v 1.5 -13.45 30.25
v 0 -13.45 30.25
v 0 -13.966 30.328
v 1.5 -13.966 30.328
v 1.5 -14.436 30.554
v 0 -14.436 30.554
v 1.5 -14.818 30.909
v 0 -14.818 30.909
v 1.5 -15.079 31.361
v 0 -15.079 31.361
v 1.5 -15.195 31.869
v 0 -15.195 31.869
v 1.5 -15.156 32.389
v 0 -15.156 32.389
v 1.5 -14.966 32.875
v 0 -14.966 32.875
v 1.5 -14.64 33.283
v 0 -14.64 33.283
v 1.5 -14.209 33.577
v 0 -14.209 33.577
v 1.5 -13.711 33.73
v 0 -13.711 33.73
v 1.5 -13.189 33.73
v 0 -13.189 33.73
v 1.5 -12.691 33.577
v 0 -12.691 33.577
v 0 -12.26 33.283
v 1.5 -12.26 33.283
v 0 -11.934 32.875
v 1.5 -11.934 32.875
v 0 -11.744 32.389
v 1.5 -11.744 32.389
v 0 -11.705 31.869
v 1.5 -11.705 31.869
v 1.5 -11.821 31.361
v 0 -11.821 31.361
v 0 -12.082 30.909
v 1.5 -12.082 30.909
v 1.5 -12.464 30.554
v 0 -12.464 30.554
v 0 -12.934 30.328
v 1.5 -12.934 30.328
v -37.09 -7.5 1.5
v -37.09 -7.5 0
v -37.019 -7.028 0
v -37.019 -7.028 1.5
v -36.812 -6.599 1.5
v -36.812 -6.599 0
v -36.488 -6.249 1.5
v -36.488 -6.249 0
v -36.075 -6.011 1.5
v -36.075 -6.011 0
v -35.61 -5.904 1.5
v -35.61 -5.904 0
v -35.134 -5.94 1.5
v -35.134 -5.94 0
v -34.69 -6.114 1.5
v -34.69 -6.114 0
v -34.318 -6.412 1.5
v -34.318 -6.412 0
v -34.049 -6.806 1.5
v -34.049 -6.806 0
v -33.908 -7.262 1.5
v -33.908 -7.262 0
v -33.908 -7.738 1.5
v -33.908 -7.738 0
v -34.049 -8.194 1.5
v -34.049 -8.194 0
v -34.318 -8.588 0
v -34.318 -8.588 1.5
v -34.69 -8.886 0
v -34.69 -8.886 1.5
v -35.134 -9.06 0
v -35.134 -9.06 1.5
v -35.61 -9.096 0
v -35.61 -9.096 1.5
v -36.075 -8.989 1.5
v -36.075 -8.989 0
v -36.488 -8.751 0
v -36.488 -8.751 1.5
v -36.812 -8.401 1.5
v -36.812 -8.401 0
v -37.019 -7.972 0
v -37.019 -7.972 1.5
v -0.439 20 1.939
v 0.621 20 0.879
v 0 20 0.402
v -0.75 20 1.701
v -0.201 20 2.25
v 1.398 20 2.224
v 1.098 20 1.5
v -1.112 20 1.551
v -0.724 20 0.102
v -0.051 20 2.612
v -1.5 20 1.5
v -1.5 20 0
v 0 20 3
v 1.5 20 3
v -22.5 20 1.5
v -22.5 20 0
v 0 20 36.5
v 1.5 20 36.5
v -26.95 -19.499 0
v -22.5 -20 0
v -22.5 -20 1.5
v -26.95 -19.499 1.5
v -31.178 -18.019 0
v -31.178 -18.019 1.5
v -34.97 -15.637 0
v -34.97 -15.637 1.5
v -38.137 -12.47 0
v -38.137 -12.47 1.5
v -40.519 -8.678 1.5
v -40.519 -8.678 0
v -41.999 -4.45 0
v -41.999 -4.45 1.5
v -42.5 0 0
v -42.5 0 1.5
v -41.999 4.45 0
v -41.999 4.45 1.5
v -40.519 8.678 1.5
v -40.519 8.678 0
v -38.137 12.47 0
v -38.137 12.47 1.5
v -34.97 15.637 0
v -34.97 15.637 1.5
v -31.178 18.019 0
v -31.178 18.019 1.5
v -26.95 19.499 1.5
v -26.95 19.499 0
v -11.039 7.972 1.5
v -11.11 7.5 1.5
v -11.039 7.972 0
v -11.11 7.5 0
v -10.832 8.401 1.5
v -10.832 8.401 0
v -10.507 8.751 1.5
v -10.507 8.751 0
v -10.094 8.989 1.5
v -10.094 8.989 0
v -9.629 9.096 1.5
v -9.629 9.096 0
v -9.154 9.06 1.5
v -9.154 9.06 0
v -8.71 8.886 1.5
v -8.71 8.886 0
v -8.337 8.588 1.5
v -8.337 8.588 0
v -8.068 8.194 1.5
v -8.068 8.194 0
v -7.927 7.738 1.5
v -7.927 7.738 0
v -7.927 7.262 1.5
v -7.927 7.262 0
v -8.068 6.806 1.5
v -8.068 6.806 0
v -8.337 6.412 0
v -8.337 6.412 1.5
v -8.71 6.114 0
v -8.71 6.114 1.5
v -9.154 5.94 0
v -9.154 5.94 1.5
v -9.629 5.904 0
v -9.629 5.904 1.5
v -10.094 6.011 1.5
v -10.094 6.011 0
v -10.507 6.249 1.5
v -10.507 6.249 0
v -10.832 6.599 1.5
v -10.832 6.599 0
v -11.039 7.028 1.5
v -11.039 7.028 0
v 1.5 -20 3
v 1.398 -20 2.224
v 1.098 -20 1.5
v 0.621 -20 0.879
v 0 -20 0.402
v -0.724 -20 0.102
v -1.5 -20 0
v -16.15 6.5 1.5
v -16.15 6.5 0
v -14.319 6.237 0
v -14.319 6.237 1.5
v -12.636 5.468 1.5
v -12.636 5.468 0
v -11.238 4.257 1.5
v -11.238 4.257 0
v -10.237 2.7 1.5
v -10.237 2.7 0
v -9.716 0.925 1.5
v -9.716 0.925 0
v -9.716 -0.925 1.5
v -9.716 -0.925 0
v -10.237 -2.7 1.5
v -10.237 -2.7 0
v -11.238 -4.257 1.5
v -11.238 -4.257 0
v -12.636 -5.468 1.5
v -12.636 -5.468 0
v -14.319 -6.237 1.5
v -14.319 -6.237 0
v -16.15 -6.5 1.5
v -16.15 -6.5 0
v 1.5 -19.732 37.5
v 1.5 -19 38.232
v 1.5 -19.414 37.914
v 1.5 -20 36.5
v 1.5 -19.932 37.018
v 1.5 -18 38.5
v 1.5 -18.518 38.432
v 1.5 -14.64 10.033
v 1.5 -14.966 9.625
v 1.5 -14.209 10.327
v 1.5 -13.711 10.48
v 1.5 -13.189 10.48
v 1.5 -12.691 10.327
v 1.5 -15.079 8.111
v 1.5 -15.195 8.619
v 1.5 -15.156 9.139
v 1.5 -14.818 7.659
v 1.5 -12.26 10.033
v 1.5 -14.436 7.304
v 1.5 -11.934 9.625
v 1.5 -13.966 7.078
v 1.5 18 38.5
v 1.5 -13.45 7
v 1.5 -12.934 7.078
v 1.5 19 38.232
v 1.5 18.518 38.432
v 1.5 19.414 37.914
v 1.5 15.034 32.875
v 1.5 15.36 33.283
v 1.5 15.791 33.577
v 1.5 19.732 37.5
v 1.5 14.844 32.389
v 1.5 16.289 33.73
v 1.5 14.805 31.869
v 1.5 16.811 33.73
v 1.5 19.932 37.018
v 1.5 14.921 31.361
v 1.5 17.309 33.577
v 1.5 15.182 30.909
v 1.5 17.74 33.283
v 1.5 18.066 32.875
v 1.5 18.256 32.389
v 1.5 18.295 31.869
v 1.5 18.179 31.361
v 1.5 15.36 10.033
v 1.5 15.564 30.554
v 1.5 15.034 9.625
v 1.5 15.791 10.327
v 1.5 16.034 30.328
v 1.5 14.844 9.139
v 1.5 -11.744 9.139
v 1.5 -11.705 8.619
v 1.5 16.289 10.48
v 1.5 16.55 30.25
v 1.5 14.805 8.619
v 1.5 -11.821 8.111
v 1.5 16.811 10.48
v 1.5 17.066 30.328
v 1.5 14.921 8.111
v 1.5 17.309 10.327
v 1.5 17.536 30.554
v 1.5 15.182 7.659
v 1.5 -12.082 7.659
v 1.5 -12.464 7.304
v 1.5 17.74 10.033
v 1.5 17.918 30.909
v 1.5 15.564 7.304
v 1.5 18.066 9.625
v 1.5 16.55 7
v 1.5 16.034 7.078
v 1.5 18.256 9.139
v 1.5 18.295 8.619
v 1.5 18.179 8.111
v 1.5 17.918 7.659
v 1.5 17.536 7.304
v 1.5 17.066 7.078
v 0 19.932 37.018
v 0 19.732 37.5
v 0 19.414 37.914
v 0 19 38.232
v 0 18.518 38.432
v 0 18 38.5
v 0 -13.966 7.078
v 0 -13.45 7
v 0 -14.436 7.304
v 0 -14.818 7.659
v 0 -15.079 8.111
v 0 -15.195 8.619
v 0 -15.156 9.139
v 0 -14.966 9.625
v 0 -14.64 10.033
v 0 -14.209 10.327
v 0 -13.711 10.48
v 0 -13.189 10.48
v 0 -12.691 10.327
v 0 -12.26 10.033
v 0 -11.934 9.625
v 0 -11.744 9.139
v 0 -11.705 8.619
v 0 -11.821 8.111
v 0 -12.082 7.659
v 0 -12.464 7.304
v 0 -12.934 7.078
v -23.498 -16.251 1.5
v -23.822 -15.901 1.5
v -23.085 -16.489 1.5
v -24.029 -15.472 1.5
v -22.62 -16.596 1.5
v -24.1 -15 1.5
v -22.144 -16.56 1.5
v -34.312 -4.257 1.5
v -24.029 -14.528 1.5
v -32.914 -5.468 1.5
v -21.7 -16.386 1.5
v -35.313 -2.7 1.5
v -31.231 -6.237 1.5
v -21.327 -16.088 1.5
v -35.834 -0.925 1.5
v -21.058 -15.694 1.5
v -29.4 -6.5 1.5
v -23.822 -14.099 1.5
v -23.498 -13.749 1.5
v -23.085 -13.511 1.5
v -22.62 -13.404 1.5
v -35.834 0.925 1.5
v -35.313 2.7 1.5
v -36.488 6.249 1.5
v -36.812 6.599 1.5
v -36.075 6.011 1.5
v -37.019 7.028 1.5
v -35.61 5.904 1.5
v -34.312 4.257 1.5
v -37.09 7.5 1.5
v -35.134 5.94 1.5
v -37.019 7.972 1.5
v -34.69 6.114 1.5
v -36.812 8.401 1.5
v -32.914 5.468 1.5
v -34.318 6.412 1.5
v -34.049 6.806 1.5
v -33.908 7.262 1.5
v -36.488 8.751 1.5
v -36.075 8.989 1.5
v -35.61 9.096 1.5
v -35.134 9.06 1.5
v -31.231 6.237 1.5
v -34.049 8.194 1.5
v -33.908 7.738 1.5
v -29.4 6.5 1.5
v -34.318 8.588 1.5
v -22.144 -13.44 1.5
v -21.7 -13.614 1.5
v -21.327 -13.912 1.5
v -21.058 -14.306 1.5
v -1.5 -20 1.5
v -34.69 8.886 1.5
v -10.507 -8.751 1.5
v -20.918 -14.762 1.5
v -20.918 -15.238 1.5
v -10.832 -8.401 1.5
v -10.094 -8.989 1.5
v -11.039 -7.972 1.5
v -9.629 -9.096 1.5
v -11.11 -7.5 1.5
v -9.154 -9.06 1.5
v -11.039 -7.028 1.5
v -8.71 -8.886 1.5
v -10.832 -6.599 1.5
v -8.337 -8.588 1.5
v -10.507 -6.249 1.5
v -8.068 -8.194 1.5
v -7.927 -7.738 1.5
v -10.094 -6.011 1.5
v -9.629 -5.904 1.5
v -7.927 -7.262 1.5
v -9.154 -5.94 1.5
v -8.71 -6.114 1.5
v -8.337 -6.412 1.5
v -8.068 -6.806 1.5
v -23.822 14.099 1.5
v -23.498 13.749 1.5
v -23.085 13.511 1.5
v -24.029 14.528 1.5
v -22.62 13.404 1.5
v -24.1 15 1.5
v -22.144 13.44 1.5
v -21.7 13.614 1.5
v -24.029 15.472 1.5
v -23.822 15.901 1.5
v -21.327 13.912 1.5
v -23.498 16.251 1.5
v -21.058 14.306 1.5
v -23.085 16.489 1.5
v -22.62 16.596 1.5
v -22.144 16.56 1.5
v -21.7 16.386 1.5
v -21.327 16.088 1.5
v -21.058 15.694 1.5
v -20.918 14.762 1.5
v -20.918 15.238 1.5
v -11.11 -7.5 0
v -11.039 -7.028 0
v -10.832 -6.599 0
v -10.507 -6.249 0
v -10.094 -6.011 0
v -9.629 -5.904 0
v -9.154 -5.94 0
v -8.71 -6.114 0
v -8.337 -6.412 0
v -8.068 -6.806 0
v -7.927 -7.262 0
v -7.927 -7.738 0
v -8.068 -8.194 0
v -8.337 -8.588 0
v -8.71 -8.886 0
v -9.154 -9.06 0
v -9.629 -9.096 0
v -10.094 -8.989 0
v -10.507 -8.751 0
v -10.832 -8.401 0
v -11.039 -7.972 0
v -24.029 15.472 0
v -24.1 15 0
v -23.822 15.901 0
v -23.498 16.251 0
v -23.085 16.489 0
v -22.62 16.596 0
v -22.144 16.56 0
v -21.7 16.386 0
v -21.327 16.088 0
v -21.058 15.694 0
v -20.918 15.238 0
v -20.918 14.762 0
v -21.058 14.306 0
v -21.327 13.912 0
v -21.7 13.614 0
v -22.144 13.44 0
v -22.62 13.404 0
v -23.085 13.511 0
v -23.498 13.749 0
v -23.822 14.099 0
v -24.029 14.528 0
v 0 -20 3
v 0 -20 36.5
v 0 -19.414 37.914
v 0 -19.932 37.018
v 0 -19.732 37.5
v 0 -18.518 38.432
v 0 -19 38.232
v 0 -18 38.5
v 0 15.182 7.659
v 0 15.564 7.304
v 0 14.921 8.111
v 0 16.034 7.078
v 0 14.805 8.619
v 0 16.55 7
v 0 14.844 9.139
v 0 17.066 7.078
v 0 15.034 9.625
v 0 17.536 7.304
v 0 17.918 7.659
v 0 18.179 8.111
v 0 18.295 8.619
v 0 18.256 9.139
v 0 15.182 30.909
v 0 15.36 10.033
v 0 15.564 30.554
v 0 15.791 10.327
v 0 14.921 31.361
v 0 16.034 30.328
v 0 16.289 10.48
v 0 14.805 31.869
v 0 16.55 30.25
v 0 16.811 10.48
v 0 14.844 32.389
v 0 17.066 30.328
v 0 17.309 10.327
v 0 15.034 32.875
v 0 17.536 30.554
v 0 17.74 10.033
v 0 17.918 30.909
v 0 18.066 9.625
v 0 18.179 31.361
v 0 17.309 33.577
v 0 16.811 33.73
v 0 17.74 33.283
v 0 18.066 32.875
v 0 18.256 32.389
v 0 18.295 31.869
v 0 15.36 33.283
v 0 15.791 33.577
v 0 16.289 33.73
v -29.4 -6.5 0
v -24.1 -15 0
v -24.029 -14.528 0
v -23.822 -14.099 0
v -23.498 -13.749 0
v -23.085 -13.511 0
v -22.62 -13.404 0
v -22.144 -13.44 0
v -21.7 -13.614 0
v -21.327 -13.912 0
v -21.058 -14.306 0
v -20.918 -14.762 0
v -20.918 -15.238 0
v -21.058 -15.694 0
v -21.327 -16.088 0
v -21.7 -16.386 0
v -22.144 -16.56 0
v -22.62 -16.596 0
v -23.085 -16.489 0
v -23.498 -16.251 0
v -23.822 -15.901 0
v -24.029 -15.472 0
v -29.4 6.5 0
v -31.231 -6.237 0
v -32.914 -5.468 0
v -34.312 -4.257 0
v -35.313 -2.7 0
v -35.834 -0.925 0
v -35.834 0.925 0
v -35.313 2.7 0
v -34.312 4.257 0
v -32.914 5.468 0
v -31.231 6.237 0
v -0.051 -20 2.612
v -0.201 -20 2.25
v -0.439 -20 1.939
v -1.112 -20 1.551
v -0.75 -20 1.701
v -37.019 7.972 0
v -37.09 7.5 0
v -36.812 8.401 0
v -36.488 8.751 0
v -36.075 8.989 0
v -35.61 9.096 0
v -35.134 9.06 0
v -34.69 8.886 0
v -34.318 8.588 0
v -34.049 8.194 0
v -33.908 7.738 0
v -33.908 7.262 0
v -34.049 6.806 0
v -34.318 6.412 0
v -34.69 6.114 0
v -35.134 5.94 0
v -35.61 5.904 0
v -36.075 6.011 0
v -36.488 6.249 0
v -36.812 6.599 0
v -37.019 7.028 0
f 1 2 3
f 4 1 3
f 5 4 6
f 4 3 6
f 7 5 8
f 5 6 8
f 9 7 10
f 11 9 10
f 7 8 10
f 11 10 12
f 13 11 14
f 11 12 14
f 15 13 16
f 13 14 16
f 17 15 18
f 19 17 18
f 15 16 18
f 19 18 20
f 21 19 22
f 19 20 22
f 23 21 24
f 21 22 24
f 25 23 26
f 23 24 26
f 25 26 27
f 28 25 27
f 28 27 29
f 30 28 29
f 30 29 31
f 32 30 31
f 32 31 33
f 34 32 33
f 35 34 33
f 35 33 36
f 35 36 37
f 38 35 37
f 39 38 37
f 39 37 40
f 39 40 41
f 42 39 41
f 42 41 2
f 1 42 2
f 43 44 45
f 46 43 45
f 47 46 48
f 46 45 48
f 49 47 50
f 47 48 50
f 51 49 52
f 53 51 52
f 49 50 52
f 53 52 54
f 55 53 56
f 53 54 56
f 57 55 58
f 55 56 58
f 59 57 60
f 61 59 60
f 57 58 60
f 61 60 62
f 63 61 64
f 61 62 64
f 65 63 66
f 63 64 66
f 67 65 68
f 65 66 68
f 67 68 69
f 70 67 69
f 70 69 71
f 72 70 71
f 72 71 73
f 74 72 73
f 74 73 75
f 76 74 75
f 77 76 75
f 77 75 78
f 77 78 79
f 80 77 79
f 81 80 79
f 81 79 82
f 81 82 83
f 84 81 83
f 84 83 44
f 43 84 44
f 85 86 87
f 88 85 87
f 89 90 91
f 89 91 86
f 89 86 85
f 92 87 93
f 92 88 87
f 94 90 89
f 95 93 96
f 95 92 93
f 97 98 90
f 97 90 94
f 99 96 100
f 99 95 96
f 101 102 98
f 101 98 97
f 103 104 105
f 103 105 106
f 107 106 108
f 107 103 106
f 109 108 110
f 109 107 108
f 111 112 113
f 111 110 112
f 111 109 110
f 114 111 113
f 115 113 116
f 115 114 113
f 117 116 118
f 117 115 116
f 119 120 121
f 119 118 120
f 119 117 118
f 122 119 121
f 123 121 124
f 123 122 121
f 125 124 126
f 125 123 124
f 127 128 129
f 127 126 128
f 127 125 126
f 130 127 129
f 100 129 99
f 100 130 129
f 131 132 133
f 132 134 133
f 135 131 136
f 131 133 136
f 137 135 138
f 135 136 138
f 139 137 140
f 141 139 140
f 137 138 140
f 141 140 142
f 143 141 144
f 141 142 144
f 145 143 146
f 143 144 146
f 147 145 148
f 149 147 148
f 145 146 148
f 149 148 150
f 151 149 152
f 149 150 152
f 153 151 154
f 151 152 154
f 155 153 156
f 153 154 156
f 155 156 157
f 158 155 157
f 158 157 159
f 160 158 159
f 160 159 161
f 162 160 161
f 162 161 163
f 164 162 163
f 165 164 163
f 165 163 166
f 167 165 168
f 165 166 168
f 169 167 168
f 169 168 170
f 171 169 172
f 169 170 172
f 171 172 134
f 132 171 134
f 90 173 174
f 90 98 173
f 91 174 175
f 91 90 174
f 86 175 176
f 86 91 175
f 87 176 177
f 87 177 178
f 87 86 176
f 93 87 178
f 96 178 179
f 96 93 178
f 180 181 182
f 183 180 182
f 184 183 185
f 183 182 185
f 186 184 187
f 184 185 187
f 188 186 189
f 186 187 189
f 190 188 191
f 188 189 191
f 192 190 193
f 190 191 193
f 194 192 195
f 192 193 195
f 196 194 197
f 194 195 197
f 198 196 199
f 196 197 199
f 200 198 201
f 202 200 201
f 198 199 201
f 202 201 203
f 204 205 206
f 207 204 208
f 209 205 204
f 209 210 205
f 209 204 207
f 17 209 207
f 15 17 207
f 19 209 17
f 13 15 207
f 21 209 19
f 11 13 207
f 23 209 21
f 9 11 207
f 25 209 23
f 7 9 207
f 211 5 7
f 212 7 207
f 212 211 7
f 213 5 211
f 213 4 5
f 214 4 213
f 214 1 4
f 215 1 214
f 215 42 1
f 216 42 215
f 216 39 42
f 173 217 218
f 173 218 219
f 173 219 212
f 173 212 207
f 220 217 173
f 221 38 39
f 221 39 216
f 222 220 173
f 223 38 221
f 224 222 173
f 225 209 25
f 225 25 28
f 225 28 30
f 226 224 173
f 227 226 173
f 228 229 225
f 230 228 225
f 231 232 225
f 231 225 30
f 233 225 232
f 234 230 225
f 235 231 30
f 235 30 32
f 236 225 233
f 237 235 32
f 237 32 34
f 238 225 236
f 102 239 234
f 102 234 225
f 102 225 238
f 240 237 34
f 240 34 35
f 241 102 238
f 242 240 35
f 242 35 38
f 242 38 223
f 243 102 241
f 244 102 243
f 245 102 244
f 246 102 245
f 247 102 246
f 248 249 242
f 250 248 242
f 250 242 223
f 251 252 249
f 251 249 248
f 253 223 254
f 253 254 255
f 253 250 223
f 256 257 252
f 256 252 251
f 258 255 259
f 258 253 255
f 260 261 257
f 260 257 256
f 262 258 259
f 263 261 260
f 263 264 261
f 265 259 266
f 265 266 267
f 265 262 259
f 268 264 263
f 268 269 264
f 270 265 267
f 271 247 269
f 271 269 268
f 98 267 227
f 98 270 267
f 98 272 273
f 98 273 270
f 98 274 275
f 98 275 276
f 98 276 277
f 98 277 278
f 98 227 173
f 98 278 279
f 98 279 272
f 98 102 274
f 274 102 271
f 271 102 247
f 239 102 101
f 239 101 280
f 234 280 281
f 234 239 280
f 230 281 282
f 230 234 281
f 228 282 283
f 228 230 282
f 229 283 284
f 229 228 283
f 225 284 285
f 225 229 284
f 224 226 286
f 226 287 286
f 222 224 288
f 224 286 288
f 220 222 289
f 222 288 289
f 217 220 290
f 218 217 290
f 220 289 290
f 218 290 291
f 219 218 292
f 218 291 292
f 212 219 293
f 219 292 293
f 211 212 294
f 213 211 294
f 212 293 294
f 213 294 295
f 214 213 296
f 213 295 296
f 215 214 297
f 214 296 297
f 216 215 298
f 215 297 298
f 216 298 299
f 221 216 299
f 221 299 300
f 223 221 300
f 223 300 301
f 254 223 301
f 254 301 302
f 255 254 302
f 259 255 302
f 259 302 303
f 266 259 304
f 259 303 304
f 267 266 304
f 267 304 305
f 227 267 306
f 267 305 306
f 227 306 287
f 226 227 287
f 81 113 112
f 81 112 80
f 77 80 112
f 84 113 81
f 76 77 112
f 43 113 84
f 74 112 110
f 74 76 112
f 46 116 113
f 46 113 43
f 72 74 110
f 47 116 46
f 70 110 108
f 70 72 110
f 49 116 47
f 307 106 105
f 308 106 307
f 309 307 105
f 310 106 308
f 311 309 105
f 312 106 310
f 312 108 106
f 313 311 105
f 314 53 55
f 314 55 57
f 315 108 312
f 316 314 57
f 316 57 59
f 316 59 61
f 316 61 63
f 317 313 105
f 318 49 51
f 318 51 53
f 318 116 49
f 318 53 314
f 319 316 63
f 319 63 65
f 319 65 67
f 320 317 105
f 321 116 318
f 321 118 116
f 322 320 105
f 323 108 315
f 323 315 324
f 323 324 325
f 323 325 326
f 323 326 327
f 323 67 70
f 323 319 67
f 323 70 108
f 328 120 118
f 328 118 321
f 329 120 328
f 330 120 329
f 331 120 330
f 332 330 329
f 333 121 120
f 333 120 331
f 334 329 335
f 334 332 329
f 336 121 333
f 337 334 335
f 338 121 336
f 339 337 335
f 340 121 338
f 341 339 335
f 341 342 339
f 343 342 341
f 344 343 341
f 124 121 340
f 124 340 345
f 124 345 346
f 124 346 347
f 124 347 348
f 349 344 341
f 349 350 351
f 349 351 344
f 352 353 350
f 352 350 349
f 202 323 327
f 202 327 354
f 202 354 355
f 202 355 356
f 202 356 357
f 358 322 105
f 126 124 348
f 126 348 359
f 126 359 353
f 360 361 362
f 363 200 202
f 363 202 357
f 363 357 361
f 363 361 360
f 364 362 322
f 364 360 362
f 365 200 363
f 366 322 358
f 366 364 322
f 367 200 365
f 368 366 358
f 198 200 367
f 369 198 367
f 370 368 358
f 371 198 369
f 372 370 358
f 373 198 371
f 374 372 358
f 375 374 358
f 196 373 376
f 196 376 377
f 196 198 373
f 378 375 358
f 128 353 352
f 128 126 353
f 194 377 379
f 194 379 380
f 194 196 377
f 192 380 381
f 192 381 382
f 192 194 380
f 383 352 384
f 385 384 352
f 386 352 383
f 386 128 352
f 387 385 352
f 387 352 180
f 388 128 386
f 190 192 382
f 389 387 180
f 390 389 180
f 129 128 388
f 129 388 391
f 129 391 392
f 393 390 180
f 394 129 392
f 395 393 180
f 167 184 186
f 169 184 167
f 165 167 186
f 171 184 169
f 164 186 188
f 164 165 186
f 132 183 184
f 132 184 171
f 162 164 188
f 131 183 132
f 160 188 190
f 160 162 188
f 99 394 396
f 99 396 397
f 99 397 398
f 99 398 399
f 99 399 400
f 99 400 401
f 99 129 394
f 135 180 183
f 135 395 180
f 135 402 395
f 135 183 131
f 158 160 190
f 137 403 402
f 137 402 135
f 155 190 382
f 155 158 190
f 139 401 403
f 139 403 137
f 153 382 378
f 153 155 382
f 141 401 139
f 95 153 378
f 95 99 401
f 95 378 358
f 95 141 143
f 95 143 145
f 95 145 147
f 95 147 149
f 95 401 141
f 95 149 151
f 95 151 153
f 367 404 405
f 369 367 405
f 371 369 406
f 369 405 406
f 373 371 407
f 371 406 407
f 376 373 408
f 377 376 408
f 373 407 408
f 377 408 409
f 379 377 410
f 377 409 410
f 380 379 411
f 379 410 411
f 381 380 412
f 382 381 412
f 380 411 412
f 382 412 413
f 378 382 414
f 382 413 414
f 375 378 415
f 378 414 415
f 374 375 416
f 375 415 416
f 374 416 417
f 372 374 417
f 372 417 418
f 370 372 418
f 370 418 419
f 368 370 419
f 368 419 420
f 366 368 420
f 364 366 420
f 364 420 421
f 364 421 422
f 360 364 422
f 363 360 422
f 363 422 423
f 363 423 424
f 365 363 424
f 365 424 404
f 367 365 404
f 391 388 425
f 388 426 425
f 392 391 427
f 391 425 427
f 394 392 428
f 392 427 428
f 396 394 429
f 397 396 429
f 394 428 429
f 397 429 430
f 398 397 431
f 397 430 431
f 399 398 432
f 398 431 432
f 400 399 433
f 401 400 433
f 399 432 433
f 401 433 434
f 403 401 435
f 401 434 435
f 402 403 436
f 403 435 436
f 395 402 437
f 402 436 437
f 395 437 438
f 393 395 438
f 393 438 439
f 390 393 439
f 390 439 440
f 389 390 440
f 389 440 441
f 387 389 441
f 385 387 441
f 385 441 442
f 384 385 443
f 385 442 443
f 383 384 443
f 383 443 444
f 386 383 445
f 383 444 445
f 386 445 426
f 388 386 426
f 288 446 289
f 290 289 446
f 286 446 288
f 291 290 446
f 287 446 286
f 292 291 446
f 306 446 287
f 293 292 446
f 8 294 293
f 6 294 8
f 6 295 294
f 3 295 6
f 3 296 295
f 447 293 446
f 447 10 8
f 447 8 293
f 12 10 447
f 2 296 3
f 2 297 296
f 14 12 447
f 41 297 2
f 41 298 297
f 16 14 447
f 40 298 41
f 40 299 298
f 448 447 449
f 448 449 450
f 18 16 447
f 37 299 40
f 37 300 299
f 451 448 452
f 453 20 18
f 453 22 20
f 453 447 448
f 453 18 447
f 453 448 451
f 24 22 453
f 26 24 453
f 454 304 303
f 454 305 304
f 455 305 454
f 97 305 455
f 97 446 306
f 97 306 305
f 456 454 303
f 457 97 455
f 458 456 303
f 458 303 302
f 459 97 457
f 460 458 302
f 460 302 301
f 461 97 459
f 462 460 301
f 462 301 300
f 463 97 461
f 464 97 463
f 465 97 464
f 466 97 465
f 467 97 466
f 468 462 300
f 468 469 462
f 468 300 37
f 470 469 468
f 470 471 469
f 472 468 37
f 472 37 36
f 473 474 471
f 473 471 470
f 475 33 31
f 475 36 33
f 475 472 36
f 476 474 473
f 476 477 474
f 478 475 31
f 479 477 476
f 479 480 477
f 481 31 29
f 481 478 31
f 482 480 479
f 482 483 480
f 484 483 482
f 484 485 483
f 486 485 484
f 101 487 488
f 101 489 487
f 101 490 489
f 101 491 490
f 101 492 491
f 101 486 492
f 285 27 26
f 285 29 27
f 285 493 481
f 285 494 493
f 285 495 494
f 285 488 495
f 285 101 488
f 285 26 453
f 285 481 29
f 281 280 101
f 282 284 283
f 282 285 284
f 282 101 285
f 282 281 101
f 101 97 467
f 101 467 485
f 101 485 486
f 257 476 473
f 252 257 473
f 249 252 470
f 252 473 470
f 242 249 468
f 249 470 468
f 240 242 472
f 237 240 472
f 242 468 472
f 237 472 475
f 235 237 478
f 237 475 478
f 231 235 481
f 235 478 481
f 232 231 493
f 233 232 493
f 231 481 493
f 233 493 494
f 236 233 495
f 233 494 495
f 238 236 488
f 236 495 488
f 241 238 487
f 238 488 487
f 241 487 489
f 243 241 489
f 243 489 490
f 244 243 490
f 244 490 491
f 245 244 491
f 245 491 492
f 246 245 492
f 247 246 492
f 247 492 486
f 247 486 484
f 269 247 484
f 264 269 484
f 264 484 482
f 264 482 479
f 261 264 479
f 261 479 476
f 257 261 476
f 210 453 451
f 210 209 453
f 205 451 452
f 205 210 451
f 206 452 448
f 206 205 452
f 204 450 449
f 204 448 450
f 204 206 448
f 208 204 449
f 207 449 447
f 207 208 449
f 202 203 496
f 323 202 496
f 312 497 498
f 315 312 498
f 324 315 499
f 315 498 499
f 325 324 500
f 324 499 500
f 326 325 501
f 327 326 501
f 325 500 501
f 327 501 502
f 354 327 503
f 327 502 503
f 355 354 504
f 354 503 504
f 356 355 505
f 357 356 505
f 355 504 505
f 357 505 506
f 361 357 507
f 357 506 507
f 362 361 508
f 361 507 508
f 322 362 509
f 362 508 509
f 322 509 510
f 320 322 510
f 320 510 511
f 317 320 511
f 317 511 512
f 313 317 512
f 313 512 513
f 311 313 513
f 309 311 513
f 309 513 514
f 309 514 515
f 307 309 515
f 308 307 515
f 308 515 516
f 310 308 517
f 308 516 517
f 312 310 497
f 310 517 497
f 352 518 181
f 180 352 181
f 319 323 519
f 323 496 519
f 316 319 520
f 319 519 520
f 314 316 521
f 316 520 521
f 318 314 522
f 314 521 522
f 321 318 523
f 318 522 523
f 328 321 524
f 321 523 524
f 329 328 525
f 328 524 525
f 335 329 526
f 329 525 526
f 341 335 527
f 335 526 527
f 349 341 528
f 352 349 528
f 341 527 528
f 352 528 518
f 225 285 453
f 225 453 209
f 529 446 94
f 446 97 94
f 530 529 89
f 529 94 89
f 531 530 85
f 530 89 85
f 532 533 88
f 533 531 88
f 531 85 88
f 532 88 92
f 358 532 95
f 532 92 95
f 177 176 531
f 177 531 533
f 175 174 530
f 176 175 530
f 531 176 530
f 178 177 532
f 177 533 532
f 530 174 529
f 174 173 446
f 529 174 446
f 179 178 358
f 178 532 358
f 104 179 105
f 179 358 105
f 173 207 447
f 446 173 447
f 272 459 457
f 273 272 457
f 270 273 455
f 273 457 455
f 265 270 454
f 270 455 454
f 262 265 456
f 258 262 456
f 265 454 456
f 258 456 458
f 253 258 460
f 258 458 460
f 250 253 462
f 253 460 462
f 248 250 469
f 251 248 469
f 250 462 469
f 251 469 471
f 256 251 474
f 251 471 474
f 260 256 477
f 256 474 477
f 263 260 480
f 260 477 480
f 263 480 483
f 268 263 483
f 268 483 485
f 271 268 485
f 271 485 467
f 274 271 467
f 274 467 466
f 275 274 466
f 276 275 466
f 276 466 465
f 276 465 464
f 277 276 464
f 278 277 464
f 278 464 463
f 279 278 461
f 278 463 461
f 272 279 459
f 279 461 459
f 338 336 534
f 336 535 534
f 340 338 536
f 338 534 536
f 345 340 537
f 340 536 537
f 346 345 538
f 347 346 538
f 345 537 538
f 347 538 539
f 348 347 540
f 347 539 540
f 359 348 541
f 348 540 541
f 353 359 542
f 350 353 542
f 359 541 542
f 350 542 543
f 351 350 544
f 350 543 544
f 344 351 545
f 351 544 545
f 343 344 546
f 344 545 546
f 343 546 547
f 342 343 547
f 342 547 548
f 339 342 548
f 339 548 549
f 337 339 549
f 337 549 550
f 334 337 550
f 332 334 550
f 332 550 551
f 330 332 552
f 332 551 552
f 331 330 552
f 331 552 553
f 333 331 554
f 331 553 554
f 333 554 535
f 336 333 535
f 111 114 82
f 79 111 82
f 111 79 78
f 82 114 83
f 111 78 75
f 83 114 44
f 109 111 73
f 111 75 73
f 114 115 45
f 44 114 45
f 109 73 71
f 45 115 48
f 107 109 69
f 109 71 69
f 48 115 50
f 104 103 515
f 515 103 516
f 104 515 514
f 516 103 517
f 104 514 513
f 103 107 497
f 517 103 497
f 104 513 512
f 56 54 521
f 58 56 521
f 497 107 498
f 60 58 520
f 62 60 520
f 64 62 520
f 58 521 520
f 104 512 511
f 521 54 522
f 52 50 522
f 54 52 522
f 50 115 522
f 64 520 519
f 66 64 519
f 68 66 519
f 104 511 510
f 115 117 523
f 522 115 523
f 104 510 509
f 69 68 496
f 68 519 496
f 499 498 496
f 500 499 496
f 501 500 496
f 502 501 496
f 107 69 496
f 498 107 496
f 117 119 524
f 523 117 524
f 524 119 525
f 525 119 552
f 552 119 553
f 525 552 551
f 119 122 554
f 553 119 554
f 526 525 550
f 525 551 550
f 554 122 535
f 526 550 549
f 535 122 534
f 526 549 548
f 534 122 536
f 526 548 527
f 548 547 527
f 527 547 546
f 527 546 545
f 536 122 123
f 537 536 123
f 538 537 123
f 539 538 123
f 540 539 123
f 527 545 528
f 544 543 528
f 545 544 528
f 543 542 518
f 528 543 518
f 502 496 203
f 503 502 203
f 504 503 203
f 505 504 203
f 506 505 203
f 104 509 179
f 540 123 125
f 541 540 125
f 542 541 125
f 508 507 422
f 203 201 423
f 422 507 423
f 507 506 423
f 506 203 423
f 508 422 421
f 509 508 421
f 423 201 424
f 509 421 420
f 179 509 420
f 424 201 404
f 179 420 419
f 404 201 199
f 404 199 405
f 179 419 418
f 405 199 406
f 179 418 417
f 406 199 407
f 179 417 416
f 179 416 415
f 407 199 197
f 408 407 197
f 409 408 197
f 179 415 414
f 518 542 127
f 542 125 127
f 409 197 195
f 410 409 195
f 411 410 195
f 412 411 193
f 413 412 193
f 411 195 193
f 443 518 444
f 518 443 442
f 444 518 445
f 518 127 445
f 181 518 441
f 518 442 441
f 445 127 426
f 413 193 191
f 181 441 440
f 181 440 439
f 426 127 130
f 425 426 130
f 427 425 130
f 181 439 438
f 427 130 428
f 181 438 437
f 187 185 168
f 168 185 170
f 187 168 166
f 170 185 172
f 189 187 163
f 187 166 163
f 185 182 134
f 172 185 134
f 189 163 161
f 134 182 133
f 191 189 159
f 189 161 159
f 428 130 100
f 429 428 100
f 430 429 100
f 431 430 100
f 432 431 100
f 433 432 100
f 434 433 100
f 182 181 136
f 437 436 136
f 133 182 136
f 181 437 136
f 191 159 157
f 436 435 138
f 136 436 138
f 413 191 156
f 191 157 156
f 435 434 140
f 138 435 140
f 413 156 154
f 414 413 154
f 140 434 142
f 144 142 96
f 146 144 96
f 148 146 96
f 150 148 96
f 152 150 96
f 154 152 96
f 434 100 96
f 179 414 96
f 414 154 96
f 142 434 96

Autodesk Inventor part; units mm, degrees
ref_plane "YZ Plane" through (0, 0, 0) normal (1, 0, 0) x (0, 1, 0)
ref_plane "XZ Plane" through (0, 0, 0) normal (0, 1, 0) x (-1, 0, 0)
ref_plane "XY Plane" through (0, 0, 0) normal (0, 0, 1) x (1, 0, 0)
sketch "Schizzo1" plane through (0, 0, 0) normal (0, 0, 1) x (1, 0, 0)
  line L0 (0, -20) -> (-22.5, -20)
  line L1 (-42.5, -20) -> (-42.5, 0)
  line L2 (-22.5, 20) -> (0, 20)
  line L3 (42.5, -20) -> (-42.5, 20) construction
  line L4 (-42.5, -20) -> (42.5, 20) construction
  arc A0 (-22.5, 20) -> (-22.5, -20) centre (-22.5, 0) ccw
  arc A1 (-2.5356, -1.1932) -> (-2.5356, 1.1932) centre (-22.5, 0) ccw
  line L5 (0, 20) -> (0, -20)
  point P0 (0, 0)
  dimension "d1" = 40
  dimension "d2" = 20
extrude "Piano1" add sketch "Schizzo1" along normal blind 1.5
sketch "Schizzo2" plane through (0, 0, 1.5) normal (0, 0, 1) x (1, 0, 0)
  line L0 (-22.5, 20) -> (0, 20) projected
  point P0 (0, 0)
sketch "Schizzo3" plane through (0, 20, 1.5) normal (1, 0, 0) x (0, 1, 0)
  line L0 (-40, 0) -> (0, 0)
  line L1 (0, 0) -> (0, 37)
  line L2 (0, 37) -> (-40, 37)
  line L3 (-40, 37) -> (-40, 0)
edge flange "Flangia1" height 38.5 angle 90 thickness 1.5 bend radius 1.5 thickness toward (1, 0, 0) relief tear relief width 1.5 relief depth 0.75 edges at (0, 0, 1.5) wall of the first edge with corners at (0, -20, 1.5) (0, 20, 1.5) (0, 20, 38.5) (0, -20, 38.5)
bend "Piega (Bend)1"
corner "Angolo1"
sketch "Schizzo4" plane through (1.5, -20, 38.5) normal (1, 0, 0) x (0, 0, -1)
  circle A0 centre (6.5, 36.55) radius 1.75
  line L0 (0, 0) -> (0, 40) projected
  line L1 (0, 40) -> (35.5, 40) projected
  circle A1 centre (29.75, 36.55) radius 1.75
  circle A2 centre (6.5, 6.55) radius 1.75
  circle A3 centre (29.75, 6.55) radius 1.75
  point P0 (38.5, 20)
  dimension "d15" = 3.5
  dimension "d16" = 6.5
  dimension "d17" = 3.45
  dimension "d18" = 3.5
  dimension "d19" = 23.25
  dimension "d20" = 3.5
  dimension "d21" = 30
  dimension "d22" = 3.5
hole "Foro1" at (1.5, 16.55, 32) at (1.5, 16.55, 8.75) at (1.5, -13.45, 8.75) at (1.5, -13.45, 32) direction (-1, 0, 0) diameter 3.5 depth 1.5 tip angle 118
sketch "Schizzo5" plane through (0, 0, 0) normal (0, 0, -1) x (-1, 0, 0)
  line L0 (16.15, 0) -> (29.4, 0) construction
  line L1 (16.15, -6.5) -> (29.4, -6.5)
  line L2 (29.4, 6.5) -> (16.15, 6.5)
  arc A0 (16.15, 6.5) -> (16.15, -6.5) centre (16.15, 0) ccw
  arc A1 (29.4, -6.5) -> (29.4, 6.5) centre (29.4, 0) ccw
  arc A2 (22.5, -20) -> (22.5, 20) centre (22.5, 0) ccw projected
  circle A3 centre (22.5, -15) radius 1.6
  circle A4 centre (35.4904, -7.5) radius 1.6
  circle A5 centre (35.4904, 7.5) radius 1.6
  circle A6 centre (22.5, 15) radius 1.6
  circle A7 centre (9.5096, 7.5) radius 1.6
  circle A8 centre (9.5096, -7.5) radius 1.6
  point P0 (0, 0)
  point P1 (22.775, 0)
  point P2 (42.5, 0)
  point P3 (35.9, 0)
  dimension "d30" = 13.25
  dimension "d31" = 13
  dimension "d32" = 6.6
  dimension "d33" = 3.2
  dimension "d34" = 15
  dimension "d39" = 360
extrude "Taglia1" cut sketch "Schizzo5" against normal blind 1.5
fillet "Arrotondamento angolo1" radius 2 2 edges at (0.75, 20, 38.5) (0.75, -20, 38.5)
equation "\"d28\" = Spessore"
equation "\"d41\" = Spessore"
equation "\"d3\" = Spessore"
equation "\"d5\" = LarghezzaScaricoPiega"
equation "\"d6\" = ProfonditàScaricoPiega"
equation "\"d7\" = ResiduoMinimo"
equation "\"d8\" = RaggioTransizione"
equation "\"d11\" = RaggioPiega"
equation "\"d12\" = DimensioniScaricoAngolo"
equation "\"d13\" = DimensioneGioco"
equation "\"d14\" = Dimensione_raggio_Jacobi"
equation "\"RaggioPiega\" = Spessore"
equation "\"LarghezzaScaricoPiega\" = Spessore"
equation "\"ProfonditàScaricoPiega\" = 0.5 * Spessore"
equation "\"DimensioniScaricoAngolo\" = 4 * Spessore"
equation "\"ResiduoMinimo\" = 2 * Spessore"
equation "\"RaggioTransizione\" = RaggioPiega"
equation "\"Dimensione_raggio_Jacobi\" = RaggioPiega"
equation "\"DimensioneGioco\" = Spessore"
equation "\"Spessore\" = 1.5"
properties part number "staffa motore"
